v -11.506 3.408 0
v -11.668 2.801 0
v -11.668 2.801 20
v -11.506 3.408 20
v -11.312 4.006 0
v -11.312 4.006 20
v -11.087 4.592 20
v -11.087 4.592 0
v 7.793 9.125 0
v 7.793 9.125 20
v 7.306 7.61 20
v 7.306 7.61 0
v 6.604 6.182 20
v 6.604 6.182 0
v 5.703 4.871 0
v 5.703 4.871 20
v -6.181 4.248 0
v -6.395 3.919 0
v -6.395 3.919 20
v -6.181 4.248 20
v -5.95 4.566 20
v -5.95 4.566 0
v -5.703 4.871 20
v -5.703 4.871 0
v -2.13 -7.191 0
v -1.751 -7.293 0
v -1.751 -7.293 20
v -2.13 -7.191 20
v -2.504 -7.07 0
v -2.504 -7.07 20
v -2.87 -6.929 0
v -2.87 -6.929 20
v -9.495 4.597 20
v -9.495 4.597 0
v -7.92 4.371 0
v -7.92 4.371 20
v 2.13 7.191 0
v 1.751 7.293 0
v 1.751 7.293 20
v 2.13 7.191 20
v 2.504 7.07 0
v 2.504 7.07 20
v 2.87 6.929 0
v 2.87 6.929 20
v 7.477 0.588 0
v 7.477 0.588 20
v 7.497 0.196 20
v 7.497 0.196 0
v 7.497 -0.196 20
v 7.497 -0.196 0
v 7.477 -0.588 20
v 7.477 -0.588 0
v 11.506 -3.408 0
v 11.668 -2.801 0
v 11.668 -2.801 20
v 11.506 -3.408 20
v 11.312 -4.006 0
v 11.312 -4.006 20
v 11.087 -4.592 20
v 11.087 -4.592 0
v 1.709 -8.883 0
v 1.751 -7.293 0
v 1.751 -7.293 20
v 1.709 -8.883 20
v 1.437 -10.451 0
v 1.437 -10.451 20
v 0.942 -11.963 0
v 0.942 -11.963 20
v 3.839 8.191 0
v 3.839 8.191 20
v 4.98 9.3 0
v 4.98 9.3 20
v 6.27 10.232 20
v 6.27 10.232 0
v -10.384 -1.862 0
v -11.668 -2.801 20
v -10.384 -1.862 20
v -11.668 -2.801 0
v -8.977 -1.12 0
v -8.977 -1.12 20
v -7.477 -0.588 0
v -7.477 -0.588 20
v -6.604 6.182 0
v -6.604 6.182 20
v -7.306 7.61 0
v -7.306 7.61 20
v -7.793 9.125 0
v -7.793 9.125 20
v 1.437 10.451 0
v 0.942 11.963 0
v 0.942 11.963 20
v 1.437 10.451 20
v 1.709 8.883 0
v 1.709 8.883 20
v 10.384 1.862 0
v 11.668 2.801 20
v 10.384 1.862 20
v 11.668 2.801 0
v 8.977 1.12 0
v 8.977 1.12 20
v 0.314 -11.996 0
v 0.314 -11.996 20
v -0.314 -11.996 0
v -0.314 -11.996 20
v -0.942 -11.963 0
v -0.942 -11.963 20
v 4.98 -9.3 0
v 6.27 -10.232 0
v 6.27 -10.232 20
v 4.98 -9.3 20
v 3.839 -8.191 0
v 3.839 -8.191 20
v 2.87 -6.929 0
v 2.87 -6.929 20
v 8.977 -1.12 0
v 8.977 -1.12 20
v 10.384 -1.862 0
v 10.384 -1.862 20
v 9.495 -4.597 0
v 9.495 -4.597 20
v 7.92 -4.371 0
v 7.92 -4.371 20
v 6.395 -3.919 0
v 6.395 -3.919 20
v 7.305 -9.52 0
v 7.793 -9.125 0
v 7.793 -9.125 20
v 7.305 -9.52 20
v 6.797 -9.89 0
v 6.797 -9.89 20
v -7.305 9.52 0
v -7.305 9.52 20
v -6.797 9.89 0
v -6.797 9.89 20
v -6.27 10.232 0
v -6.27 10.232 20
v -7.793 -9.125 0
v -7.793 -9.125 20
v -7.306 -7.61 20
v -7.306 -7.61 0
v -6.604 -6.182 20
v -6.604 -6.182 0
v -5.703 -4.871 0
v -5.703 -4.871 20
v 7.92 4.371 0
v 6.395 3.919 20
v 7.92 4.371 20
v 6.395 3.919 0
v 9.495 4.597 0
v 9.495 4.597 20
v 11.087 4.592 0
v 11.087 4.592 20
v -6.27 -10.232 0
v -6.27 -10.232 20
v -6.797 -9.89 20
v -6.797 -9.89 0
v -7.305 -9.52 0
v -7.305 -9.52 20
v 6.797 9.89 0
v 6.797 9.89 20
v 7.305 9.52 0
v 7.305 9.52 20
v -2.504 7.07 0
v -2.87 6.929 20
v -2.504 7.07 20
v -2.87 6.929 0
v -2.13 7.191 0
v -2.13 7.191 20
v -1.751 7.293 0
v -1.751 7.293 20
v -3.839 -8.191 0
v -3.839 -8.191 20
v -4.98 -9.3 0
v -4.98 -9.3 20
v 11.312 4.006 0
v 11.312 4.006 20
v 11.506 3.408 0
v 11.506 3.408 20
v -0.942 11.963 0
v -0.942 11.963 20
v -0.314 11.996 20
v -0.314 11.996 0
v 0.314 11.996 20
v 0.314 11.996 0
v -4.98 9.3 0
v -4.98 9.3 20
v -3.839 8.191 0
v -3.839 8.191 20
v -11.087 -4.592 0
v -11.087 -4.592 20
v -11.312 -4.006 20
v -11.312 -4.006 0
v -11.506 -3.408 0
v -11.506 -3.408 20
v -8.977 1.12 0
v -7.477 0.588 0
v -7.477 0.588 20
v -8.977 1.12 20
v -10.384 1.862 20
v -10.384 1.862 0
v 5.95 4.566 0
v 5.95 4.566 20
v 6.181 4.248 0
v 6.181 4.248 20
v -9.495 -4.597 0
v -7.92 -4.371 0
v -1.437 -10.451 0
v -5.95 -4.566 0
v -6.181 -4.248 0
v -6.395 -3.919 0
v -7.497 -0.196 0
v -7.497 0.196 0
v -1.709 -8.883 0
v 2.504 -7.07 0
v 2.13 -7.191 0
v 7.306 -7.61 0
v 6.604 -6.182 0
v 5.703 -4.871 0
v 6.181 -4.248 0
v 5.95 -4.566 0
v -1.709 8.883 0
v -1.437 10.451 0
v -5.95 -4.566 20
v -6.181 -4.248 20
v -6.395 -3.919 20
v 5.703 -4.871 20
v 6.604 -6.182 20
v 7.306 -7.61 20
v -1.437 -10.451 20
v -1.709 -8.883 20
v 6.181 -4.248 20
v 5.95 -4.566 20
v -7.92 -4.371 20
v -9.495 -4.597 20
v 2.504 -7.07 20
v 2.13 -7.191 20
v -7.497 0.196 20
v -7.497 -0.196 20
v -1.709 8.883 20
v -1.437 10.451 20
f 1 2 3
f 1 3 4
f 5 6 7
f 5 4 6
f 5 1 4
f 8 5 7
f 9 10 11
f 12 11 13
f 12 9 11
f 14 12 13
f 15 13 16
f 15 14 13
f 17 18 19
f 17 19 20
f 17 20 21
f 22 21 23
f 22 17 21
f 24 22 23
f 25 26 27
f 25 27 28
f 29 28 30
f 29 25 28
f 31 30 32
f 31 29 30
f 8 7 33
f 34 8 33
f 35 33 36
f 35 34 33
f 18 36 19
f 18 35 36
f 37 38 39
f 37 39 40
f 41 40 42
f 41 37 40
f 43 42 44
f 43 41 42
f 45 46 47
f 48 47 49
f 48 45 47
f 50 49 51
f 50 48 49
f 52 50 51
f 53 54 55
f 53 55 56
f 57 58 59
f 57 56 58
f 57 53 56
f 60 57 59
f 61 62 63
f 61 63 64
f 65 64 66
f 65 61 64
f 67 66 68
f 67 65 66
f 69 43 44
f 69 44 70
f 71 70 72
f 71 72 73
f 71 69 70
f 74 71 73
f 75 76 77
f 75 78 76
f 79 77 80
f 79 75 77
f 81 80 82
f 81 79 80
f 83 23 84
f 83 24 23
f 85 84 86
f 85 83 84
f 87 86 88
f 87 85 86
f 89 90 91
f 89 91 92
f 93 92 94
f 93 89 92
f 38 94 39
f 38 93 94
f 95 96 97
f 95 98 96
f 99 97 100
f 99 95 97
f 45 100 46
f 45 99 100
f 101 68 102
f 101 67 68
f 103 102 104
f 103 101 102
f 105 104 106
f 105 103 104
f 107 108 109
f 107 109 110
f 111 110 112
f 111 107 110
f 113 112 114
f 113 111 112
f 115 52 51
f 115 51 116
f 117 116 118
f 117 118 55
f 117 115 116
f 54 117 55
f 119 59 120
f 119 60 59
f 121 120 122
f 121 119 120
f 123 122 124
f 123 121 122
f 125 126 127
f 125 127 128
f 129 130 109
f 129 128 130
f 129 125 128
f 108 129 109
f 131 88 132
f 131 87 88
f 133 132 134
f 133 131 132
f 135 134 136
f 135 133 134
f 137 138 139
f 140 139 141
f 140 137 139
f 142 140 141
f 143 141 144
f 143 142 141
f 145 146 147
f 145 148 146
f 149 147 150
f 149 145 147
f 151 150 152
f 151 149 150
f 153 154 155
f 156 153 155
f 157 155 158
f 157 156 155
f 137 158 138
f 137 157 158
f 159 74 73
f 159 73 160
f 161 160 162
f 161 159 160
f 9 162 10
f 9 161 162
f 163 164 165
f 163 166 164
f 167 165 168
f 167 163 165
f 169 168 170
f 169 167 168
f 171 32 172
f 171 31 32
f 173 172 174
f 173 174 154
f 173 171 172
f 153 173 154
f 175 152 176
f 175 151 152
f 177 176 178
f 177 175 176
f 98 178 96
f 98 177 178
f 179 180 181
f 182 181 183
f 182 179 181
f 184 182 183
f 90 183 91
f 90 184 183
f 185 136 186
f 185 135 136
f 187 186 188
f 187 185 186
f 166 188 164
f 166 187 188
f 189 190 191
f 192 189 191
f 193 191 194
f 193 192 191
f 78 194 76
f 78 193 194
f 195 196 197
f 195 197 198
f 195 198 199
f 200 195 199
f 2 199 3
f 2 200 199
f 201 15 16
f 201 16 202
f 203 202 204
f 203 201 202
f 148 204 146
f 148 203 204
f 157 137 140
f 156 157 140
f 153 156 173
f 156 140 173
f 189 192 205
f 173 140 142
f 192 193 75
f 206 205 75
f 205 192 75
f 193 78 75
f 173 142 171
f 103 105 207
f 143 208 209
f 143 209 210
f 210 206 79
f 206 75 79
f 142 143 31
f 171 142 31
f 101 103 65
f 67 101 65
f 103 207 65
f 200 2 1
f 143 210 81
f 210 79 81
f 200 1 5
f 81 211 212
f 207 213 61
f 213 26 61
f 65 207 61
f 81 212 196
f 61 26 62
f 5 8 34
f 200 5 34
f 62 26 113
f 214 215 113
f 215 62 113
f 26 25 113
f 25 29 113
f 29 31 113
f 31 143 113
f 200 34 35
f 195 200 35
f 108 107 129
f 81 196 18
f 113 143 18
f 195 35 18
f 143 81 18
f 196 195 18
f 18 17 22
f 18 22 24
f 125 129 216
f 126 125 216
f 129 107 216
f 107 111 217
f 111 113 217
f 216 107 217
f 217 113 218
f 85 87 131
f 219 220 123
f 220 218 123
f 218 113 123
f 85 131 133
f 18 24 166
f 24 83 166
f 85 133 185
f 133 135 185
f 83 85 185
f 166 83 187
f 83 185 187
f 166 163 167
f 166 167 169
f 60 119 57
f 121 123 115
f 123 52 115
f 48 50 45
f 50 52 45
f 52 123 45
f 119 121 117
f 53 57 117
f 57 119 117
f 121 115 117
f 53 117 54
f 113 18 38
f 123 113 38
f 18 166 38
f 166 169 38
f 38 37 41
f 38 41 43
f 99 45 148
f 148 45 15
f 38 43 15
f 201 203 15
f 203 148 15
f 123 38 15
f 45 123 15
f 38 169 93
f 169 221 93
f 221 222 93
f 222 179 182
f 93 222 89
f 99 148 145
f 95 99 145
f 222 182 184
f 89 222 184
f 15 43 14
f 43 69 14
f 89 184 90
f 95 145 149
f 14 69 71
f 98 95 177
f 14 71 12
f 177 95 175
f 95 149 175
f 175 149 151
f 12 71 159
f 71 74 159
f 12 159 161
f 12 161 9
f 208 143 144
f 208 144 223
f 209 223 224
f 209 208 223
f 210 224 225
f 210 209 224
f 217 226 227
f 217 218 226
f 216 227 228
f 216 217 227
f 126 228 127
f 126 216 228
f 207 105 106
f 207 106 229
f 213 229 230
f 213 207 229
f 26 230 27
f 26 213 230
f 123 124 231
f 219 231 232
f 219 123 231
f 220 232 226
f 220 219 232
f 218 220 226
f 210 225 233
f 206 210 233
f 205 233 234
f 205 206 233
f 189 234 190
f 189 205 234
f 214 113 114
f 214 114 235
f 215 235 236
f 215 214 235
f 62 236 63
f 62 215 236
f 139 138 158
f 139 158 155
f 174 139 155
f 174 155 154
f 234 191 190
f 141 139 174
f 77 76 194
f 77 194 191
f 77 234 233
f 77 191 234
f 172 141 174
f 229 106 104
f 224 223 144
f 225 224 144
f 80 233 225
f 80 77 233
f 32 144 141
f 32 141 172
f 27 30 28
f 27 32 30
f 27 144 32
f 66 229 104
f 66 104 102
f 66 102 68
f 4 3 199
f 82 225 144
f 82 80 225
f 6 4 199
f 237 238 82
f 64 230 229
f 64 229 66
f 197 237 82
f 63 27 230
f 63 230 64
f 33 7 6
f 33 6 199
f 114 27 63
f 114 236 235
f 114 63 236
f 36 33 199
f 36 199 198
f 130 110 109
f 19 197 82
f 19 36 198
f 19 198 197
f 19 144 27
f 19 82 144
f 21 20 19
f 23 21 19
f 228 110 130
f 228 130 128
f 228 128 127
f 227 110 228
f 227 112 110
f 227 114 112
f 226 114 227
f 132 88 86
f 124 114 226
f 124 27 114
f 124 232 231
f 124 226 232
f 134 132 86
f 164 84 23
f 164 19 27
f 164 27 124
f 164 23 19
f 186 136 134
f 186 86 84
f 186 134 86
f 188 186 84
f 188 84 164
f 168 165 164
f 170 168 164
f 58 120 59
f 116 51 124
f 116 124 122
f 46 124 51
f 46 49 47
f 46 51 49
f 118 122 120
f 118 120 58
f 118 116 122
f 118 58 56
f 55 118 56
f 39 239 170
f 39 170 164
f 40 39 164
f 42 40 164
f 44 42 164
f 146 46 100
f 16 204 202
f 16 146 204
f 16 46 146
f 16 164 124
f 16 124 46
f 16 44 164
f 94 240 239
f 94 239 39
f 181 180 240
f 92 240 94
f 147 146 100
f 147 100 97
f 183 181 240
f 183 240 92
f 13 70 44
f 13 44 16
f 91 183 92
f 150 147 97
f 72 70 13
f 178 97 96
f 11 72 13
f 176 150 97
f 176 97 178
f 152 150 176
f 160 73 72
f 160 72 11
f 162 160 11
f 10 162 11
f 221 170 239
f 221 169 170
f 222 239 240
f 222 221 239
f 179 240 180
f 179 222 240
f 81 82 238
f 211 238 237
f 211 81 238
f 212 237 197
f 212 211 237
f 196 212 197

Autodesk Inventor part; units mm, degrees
sketch "Sketch1" plane through (0, 0, 0) normal (0, 0, 1) x (1, 0, 0)
  circle A0 centre (0, 0) radius 12
  dimension "d0" = 24
extrude "Extrusion1" add sketch "Sketch1" along normal blind 20
ref_plane "Work Plane2" through (0, 0, 10) normal (0, 0, 1) x (1, 0, 0)
sketch "Sketch2" plane through (0, 0, 0) normal (0, 0, -1) x (-1, 0, 0)
  circle A0 centre (0, 0) radius 12 projected
  circle A1 centre (0, 0) radius 10
  dimension "d3" = 20
surface extrude "Средний диаметр" sketch "Sketch2" against normal through all shown no curves A1
ref_plane "Work Plane8" through (0, 0, 0) normal (0.9510565, 0.309017, 0) x (0, 0, 1)
ref_plane "Work Plane9" through (0, 0, 0) normal (1, 0, 0) x (0, 1, 0)
spur gear teeth "Цилиндрическое зубчатое зацепление" teeth 10 pitch diameter 20 tip diameter 24 root diameter 15 face width 20 start plane through (0, 0, 0) normal (0, 0, -1) x (-1, 0, 0)
equation "\"d0\" = da_da"
equation "\"d1\" = da_b"
equation "\"d3\" = da_dw"
equation "\"da_da\" = 24"
equation "\"da_b\" = 20"
equation "\"da_dw\" = 20"
properties part number "Цилиндрическое зубчатое зацепление1" material "Steel"
